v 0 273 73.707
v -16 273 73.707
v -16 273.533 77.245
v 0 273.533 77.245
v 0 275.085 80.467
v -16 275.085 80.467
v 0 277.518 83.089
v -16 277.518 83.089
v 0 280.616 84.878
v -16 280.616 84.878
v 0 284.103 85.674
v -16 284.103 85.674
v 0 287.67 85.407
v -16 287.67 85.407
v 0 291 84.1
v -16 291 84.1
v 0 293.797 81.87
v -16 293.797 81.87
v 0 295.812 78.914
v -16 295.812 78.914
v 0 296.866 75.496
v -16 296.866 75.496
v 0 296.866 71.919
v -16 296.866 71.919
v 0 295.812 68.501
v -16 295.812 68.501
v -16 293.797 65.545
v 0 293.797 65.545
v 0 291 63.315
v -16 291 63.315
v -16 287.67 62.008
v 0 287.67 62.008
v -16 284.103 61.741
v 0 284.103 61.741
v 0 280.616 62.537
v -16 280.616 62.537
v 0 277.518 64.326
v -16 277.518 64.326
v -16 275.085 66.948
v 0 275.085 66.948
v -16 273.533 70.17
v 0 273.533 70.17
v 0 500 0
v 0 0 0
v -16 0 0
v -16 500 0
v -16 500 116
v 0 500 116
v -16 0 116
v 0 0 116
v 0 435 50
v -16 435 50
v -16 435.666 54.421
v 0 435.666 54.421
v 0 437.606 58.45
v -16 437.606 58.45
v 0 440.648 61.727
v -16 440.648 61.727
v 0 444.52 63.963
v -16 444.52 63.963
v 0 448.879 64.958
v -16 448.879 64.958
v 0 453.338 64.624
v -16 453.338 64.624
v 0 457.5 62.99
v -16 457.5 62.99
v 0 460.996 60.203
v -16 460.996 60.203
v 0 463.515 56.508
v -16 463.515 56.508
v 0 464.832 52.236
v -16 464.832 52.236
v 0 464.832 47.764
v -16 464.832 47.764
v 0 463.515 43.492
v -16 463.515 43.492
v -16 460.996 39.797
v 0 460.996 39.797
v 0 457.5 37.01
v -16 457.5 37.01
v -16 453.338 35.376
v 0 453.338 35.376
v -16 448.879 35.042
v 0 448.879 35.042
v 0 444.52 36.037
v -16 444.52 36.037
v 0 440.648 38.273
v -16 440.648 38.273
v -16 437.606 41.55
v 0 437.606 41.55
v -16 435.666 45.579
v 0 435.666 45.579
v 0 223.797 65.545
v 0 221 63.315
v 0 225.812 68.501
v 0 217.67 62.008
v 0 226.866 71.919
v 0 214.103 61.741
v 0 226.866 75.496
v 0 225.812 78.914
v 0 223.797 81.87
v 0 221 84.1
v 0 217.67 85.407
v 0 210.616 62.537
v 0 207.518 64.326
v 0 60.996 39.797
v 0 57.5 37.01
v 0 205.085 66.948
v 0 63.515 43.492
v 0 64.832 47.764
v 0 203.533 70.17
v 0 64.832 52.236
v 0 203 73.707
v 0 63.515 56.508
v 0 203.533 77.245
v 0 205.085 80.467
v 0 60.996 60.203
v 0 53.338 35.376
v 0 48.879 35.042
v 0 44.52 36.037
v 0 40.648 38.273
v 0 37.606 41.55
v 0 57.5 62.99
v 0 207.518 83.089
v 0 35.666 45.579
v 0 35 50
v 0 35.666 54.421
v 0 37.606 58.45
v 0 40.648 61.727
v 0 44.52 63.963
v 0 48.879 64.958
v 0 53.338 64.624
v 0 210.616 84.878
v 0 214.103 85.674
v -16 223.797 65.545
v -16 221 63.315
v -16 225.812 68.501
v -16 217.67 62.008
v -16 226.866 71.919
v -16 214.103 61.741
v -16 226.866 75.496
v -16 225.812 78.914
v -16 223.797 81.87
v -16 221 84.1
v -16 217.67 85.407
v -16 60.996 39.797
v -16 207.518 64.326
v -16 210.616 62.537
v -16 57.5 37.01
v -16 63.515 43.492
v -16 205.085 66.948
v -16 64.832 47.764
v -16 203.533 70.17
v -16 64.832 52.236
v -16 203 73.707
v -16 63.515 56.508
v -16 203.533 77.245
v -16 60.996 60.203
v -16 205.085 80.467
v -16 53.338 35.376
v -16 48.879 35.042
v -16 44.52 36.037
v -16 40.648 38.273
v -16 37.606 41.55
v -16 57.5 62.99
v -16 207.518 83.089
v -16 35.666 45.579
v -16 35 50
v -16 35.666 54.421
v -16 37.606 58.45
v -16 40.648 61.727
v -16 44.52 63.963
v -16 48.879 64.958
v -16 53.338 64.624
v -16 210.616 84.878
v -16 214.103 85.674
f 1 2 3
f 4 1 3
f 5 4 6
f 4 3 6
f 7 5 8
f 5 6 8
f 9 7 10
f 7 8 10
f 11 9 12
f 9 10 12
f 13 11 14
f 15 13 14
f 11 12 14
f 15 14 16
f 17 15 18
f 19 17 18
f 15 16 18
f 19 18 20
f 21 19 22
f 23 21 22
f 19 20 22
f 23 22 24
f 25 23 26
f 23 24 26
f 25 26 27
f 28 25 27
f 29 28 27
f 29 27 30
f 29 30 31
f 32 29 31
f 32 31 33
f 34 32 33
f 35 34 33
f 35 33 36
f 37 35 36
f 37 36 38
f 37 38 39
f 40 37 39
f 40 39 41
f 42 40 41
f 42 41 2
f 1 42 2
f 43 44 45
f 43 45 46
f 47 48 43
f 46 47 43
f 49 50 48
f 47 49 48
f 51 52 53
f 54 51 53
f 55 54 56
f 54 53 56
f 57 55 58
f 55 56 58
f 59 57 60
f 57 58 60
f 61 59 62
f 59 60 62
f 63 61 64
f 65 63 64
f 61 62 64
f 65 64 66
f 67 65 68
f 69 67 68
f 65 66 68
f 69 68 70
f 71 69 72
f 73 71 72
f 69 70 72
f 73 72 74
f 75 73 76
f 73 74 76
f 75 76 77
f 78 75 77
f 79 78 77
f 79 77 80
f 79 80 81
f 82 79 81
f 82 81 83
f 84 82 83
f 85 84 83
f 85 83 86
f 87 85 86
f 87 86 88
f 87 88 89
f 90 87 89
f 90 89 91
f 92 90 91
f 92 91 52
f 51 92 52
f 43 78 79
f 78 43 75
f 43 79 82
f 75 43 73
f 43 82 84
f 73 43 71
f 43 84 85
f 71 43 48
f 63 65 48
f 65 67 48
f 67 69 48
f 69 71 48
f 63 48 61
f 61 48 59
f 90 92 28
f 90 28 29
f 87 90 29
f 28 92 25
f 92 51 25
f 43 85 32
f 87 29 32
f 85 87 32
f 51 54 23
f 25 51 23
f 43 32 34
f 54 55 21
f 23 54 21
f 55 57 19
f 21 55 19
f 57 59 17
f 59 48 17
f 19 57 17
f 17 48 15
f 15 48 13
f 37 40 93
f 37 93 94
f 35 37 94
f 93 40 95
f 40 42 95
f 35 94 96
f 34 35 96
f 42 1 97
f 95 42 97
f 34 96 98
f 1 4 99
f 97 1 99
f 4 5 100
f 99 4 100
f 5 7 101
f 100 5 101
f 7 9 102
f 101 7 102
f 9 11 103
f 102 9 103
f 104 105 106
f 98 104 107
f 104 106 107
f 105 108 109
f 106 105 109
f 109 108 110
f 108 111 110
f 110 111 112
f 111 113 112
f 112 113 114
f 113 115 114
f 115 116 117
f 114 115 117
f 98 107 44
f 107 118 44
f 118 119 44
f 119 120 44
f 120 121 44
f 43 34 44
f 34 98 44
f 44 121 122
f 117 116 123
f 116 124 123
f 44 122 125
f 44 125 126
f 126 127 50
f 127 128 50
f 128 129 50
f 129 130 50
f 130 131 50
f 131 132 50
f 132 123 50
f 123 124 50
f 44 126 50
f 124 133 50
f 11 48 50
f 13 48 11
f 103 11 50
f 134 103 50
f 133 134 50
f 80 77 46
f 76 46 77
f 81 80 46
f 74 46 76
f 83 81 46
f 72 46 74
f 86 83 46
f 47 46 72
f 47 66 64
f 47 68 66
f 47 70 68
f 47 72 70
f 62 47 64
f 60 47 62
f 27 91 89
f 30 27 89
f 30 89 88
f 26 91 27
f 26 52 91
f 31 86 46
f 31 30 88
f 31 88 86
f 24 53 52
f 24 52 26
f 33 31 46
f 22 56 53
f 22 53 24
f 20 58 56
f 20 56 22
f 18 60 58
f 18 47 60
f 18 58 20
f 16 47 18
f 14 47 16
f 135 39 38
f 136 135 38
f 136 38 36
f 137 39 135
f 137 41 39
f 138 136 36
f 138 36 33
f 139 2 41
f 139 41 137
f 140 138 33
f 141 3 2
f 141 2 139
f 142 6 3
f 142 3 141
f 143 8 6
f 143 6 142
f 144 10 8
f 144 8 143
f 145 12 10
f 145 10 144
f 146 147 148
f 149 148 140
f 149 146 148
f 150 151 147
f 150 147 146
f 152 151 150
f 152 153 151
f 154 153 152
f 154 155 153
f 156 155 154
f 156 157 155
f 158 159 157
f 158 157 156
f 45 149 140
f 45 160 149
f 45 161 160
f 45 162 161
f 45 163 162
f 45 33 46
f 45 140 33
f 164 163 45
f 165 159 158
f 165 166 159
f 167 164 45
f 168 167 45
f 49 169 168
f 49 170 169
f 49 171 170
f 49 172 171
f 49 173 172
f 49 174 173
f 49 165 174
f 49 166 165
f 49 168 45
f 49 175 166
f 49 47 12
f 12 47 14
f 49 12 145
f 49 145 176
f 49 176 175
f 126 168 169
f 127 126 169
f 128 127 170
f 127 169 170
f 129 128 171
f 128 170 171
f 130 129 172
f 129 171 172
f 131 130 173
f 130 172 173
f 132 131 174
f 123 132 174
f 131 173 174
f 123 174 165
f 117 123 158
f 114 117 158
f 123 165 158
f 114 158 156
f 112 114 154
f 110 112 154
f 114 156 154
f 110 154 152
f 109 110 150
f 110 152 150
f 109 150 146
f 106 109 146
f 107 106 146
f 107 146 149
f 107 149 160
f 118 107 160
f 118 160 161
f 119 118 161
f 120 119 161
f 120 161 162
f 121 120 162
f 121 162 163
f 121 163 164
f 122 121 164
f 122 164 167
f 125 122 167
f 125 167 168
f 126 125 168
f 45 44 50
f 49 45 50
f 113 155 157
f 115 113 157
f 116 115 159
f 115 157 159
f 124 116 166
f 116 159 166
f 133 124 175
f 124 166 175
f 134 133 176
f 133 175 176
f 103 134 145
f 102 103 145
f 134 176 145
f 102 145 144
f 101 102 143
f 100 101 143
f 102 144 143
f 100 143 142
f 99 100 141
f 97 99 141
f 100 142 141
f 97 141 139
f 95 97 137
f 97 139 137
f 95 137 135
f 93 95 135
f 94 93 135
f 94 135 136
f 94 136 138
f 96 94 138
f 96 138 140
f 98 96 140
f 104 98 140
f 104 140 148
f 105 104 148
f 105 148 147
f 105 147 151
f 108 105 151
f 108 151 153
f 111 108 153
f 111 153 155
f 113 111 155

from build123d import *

# Parameters (mm, degrees)
PAD_DEPTH     = 16
SKETCH001_R   = 12
SKETCH001_R_2 = 15
POCKET_DEPTH  = 20


with BuildPart() as part:
    # Sketch → Pad (new body)
    with BuildSketch(Plane.YZ):
        Polygon((0, 0), (0, 116), (500, 116), (500, 0), (250, 0), align=None)
    extrude(amount=-PAD_DEPTH)

    # Sketch001 (on Face7 of Pad) → Pocket (cut)
    with BuildSketch(Plane(origin=(-16, 0, 0), x_dir=(0, -1, 0), z_dir=(-1, 0, 0))):
        with Locations((-215, 73.70748)):
            Circle(SKETCH001_R)
        with Locations((-285, 73.70748)):
            Circle(SKETCH001_R)
        with Locations((-450, 50)):
            Circle(SKETCH001_R_2)
        with Locations((-50, 50)):
            Circle(SKETCH001_R_2)
    extrude(amount=-POCKET_DEPTH, mode=Mode.SUBTRACT)


solid = part.part
